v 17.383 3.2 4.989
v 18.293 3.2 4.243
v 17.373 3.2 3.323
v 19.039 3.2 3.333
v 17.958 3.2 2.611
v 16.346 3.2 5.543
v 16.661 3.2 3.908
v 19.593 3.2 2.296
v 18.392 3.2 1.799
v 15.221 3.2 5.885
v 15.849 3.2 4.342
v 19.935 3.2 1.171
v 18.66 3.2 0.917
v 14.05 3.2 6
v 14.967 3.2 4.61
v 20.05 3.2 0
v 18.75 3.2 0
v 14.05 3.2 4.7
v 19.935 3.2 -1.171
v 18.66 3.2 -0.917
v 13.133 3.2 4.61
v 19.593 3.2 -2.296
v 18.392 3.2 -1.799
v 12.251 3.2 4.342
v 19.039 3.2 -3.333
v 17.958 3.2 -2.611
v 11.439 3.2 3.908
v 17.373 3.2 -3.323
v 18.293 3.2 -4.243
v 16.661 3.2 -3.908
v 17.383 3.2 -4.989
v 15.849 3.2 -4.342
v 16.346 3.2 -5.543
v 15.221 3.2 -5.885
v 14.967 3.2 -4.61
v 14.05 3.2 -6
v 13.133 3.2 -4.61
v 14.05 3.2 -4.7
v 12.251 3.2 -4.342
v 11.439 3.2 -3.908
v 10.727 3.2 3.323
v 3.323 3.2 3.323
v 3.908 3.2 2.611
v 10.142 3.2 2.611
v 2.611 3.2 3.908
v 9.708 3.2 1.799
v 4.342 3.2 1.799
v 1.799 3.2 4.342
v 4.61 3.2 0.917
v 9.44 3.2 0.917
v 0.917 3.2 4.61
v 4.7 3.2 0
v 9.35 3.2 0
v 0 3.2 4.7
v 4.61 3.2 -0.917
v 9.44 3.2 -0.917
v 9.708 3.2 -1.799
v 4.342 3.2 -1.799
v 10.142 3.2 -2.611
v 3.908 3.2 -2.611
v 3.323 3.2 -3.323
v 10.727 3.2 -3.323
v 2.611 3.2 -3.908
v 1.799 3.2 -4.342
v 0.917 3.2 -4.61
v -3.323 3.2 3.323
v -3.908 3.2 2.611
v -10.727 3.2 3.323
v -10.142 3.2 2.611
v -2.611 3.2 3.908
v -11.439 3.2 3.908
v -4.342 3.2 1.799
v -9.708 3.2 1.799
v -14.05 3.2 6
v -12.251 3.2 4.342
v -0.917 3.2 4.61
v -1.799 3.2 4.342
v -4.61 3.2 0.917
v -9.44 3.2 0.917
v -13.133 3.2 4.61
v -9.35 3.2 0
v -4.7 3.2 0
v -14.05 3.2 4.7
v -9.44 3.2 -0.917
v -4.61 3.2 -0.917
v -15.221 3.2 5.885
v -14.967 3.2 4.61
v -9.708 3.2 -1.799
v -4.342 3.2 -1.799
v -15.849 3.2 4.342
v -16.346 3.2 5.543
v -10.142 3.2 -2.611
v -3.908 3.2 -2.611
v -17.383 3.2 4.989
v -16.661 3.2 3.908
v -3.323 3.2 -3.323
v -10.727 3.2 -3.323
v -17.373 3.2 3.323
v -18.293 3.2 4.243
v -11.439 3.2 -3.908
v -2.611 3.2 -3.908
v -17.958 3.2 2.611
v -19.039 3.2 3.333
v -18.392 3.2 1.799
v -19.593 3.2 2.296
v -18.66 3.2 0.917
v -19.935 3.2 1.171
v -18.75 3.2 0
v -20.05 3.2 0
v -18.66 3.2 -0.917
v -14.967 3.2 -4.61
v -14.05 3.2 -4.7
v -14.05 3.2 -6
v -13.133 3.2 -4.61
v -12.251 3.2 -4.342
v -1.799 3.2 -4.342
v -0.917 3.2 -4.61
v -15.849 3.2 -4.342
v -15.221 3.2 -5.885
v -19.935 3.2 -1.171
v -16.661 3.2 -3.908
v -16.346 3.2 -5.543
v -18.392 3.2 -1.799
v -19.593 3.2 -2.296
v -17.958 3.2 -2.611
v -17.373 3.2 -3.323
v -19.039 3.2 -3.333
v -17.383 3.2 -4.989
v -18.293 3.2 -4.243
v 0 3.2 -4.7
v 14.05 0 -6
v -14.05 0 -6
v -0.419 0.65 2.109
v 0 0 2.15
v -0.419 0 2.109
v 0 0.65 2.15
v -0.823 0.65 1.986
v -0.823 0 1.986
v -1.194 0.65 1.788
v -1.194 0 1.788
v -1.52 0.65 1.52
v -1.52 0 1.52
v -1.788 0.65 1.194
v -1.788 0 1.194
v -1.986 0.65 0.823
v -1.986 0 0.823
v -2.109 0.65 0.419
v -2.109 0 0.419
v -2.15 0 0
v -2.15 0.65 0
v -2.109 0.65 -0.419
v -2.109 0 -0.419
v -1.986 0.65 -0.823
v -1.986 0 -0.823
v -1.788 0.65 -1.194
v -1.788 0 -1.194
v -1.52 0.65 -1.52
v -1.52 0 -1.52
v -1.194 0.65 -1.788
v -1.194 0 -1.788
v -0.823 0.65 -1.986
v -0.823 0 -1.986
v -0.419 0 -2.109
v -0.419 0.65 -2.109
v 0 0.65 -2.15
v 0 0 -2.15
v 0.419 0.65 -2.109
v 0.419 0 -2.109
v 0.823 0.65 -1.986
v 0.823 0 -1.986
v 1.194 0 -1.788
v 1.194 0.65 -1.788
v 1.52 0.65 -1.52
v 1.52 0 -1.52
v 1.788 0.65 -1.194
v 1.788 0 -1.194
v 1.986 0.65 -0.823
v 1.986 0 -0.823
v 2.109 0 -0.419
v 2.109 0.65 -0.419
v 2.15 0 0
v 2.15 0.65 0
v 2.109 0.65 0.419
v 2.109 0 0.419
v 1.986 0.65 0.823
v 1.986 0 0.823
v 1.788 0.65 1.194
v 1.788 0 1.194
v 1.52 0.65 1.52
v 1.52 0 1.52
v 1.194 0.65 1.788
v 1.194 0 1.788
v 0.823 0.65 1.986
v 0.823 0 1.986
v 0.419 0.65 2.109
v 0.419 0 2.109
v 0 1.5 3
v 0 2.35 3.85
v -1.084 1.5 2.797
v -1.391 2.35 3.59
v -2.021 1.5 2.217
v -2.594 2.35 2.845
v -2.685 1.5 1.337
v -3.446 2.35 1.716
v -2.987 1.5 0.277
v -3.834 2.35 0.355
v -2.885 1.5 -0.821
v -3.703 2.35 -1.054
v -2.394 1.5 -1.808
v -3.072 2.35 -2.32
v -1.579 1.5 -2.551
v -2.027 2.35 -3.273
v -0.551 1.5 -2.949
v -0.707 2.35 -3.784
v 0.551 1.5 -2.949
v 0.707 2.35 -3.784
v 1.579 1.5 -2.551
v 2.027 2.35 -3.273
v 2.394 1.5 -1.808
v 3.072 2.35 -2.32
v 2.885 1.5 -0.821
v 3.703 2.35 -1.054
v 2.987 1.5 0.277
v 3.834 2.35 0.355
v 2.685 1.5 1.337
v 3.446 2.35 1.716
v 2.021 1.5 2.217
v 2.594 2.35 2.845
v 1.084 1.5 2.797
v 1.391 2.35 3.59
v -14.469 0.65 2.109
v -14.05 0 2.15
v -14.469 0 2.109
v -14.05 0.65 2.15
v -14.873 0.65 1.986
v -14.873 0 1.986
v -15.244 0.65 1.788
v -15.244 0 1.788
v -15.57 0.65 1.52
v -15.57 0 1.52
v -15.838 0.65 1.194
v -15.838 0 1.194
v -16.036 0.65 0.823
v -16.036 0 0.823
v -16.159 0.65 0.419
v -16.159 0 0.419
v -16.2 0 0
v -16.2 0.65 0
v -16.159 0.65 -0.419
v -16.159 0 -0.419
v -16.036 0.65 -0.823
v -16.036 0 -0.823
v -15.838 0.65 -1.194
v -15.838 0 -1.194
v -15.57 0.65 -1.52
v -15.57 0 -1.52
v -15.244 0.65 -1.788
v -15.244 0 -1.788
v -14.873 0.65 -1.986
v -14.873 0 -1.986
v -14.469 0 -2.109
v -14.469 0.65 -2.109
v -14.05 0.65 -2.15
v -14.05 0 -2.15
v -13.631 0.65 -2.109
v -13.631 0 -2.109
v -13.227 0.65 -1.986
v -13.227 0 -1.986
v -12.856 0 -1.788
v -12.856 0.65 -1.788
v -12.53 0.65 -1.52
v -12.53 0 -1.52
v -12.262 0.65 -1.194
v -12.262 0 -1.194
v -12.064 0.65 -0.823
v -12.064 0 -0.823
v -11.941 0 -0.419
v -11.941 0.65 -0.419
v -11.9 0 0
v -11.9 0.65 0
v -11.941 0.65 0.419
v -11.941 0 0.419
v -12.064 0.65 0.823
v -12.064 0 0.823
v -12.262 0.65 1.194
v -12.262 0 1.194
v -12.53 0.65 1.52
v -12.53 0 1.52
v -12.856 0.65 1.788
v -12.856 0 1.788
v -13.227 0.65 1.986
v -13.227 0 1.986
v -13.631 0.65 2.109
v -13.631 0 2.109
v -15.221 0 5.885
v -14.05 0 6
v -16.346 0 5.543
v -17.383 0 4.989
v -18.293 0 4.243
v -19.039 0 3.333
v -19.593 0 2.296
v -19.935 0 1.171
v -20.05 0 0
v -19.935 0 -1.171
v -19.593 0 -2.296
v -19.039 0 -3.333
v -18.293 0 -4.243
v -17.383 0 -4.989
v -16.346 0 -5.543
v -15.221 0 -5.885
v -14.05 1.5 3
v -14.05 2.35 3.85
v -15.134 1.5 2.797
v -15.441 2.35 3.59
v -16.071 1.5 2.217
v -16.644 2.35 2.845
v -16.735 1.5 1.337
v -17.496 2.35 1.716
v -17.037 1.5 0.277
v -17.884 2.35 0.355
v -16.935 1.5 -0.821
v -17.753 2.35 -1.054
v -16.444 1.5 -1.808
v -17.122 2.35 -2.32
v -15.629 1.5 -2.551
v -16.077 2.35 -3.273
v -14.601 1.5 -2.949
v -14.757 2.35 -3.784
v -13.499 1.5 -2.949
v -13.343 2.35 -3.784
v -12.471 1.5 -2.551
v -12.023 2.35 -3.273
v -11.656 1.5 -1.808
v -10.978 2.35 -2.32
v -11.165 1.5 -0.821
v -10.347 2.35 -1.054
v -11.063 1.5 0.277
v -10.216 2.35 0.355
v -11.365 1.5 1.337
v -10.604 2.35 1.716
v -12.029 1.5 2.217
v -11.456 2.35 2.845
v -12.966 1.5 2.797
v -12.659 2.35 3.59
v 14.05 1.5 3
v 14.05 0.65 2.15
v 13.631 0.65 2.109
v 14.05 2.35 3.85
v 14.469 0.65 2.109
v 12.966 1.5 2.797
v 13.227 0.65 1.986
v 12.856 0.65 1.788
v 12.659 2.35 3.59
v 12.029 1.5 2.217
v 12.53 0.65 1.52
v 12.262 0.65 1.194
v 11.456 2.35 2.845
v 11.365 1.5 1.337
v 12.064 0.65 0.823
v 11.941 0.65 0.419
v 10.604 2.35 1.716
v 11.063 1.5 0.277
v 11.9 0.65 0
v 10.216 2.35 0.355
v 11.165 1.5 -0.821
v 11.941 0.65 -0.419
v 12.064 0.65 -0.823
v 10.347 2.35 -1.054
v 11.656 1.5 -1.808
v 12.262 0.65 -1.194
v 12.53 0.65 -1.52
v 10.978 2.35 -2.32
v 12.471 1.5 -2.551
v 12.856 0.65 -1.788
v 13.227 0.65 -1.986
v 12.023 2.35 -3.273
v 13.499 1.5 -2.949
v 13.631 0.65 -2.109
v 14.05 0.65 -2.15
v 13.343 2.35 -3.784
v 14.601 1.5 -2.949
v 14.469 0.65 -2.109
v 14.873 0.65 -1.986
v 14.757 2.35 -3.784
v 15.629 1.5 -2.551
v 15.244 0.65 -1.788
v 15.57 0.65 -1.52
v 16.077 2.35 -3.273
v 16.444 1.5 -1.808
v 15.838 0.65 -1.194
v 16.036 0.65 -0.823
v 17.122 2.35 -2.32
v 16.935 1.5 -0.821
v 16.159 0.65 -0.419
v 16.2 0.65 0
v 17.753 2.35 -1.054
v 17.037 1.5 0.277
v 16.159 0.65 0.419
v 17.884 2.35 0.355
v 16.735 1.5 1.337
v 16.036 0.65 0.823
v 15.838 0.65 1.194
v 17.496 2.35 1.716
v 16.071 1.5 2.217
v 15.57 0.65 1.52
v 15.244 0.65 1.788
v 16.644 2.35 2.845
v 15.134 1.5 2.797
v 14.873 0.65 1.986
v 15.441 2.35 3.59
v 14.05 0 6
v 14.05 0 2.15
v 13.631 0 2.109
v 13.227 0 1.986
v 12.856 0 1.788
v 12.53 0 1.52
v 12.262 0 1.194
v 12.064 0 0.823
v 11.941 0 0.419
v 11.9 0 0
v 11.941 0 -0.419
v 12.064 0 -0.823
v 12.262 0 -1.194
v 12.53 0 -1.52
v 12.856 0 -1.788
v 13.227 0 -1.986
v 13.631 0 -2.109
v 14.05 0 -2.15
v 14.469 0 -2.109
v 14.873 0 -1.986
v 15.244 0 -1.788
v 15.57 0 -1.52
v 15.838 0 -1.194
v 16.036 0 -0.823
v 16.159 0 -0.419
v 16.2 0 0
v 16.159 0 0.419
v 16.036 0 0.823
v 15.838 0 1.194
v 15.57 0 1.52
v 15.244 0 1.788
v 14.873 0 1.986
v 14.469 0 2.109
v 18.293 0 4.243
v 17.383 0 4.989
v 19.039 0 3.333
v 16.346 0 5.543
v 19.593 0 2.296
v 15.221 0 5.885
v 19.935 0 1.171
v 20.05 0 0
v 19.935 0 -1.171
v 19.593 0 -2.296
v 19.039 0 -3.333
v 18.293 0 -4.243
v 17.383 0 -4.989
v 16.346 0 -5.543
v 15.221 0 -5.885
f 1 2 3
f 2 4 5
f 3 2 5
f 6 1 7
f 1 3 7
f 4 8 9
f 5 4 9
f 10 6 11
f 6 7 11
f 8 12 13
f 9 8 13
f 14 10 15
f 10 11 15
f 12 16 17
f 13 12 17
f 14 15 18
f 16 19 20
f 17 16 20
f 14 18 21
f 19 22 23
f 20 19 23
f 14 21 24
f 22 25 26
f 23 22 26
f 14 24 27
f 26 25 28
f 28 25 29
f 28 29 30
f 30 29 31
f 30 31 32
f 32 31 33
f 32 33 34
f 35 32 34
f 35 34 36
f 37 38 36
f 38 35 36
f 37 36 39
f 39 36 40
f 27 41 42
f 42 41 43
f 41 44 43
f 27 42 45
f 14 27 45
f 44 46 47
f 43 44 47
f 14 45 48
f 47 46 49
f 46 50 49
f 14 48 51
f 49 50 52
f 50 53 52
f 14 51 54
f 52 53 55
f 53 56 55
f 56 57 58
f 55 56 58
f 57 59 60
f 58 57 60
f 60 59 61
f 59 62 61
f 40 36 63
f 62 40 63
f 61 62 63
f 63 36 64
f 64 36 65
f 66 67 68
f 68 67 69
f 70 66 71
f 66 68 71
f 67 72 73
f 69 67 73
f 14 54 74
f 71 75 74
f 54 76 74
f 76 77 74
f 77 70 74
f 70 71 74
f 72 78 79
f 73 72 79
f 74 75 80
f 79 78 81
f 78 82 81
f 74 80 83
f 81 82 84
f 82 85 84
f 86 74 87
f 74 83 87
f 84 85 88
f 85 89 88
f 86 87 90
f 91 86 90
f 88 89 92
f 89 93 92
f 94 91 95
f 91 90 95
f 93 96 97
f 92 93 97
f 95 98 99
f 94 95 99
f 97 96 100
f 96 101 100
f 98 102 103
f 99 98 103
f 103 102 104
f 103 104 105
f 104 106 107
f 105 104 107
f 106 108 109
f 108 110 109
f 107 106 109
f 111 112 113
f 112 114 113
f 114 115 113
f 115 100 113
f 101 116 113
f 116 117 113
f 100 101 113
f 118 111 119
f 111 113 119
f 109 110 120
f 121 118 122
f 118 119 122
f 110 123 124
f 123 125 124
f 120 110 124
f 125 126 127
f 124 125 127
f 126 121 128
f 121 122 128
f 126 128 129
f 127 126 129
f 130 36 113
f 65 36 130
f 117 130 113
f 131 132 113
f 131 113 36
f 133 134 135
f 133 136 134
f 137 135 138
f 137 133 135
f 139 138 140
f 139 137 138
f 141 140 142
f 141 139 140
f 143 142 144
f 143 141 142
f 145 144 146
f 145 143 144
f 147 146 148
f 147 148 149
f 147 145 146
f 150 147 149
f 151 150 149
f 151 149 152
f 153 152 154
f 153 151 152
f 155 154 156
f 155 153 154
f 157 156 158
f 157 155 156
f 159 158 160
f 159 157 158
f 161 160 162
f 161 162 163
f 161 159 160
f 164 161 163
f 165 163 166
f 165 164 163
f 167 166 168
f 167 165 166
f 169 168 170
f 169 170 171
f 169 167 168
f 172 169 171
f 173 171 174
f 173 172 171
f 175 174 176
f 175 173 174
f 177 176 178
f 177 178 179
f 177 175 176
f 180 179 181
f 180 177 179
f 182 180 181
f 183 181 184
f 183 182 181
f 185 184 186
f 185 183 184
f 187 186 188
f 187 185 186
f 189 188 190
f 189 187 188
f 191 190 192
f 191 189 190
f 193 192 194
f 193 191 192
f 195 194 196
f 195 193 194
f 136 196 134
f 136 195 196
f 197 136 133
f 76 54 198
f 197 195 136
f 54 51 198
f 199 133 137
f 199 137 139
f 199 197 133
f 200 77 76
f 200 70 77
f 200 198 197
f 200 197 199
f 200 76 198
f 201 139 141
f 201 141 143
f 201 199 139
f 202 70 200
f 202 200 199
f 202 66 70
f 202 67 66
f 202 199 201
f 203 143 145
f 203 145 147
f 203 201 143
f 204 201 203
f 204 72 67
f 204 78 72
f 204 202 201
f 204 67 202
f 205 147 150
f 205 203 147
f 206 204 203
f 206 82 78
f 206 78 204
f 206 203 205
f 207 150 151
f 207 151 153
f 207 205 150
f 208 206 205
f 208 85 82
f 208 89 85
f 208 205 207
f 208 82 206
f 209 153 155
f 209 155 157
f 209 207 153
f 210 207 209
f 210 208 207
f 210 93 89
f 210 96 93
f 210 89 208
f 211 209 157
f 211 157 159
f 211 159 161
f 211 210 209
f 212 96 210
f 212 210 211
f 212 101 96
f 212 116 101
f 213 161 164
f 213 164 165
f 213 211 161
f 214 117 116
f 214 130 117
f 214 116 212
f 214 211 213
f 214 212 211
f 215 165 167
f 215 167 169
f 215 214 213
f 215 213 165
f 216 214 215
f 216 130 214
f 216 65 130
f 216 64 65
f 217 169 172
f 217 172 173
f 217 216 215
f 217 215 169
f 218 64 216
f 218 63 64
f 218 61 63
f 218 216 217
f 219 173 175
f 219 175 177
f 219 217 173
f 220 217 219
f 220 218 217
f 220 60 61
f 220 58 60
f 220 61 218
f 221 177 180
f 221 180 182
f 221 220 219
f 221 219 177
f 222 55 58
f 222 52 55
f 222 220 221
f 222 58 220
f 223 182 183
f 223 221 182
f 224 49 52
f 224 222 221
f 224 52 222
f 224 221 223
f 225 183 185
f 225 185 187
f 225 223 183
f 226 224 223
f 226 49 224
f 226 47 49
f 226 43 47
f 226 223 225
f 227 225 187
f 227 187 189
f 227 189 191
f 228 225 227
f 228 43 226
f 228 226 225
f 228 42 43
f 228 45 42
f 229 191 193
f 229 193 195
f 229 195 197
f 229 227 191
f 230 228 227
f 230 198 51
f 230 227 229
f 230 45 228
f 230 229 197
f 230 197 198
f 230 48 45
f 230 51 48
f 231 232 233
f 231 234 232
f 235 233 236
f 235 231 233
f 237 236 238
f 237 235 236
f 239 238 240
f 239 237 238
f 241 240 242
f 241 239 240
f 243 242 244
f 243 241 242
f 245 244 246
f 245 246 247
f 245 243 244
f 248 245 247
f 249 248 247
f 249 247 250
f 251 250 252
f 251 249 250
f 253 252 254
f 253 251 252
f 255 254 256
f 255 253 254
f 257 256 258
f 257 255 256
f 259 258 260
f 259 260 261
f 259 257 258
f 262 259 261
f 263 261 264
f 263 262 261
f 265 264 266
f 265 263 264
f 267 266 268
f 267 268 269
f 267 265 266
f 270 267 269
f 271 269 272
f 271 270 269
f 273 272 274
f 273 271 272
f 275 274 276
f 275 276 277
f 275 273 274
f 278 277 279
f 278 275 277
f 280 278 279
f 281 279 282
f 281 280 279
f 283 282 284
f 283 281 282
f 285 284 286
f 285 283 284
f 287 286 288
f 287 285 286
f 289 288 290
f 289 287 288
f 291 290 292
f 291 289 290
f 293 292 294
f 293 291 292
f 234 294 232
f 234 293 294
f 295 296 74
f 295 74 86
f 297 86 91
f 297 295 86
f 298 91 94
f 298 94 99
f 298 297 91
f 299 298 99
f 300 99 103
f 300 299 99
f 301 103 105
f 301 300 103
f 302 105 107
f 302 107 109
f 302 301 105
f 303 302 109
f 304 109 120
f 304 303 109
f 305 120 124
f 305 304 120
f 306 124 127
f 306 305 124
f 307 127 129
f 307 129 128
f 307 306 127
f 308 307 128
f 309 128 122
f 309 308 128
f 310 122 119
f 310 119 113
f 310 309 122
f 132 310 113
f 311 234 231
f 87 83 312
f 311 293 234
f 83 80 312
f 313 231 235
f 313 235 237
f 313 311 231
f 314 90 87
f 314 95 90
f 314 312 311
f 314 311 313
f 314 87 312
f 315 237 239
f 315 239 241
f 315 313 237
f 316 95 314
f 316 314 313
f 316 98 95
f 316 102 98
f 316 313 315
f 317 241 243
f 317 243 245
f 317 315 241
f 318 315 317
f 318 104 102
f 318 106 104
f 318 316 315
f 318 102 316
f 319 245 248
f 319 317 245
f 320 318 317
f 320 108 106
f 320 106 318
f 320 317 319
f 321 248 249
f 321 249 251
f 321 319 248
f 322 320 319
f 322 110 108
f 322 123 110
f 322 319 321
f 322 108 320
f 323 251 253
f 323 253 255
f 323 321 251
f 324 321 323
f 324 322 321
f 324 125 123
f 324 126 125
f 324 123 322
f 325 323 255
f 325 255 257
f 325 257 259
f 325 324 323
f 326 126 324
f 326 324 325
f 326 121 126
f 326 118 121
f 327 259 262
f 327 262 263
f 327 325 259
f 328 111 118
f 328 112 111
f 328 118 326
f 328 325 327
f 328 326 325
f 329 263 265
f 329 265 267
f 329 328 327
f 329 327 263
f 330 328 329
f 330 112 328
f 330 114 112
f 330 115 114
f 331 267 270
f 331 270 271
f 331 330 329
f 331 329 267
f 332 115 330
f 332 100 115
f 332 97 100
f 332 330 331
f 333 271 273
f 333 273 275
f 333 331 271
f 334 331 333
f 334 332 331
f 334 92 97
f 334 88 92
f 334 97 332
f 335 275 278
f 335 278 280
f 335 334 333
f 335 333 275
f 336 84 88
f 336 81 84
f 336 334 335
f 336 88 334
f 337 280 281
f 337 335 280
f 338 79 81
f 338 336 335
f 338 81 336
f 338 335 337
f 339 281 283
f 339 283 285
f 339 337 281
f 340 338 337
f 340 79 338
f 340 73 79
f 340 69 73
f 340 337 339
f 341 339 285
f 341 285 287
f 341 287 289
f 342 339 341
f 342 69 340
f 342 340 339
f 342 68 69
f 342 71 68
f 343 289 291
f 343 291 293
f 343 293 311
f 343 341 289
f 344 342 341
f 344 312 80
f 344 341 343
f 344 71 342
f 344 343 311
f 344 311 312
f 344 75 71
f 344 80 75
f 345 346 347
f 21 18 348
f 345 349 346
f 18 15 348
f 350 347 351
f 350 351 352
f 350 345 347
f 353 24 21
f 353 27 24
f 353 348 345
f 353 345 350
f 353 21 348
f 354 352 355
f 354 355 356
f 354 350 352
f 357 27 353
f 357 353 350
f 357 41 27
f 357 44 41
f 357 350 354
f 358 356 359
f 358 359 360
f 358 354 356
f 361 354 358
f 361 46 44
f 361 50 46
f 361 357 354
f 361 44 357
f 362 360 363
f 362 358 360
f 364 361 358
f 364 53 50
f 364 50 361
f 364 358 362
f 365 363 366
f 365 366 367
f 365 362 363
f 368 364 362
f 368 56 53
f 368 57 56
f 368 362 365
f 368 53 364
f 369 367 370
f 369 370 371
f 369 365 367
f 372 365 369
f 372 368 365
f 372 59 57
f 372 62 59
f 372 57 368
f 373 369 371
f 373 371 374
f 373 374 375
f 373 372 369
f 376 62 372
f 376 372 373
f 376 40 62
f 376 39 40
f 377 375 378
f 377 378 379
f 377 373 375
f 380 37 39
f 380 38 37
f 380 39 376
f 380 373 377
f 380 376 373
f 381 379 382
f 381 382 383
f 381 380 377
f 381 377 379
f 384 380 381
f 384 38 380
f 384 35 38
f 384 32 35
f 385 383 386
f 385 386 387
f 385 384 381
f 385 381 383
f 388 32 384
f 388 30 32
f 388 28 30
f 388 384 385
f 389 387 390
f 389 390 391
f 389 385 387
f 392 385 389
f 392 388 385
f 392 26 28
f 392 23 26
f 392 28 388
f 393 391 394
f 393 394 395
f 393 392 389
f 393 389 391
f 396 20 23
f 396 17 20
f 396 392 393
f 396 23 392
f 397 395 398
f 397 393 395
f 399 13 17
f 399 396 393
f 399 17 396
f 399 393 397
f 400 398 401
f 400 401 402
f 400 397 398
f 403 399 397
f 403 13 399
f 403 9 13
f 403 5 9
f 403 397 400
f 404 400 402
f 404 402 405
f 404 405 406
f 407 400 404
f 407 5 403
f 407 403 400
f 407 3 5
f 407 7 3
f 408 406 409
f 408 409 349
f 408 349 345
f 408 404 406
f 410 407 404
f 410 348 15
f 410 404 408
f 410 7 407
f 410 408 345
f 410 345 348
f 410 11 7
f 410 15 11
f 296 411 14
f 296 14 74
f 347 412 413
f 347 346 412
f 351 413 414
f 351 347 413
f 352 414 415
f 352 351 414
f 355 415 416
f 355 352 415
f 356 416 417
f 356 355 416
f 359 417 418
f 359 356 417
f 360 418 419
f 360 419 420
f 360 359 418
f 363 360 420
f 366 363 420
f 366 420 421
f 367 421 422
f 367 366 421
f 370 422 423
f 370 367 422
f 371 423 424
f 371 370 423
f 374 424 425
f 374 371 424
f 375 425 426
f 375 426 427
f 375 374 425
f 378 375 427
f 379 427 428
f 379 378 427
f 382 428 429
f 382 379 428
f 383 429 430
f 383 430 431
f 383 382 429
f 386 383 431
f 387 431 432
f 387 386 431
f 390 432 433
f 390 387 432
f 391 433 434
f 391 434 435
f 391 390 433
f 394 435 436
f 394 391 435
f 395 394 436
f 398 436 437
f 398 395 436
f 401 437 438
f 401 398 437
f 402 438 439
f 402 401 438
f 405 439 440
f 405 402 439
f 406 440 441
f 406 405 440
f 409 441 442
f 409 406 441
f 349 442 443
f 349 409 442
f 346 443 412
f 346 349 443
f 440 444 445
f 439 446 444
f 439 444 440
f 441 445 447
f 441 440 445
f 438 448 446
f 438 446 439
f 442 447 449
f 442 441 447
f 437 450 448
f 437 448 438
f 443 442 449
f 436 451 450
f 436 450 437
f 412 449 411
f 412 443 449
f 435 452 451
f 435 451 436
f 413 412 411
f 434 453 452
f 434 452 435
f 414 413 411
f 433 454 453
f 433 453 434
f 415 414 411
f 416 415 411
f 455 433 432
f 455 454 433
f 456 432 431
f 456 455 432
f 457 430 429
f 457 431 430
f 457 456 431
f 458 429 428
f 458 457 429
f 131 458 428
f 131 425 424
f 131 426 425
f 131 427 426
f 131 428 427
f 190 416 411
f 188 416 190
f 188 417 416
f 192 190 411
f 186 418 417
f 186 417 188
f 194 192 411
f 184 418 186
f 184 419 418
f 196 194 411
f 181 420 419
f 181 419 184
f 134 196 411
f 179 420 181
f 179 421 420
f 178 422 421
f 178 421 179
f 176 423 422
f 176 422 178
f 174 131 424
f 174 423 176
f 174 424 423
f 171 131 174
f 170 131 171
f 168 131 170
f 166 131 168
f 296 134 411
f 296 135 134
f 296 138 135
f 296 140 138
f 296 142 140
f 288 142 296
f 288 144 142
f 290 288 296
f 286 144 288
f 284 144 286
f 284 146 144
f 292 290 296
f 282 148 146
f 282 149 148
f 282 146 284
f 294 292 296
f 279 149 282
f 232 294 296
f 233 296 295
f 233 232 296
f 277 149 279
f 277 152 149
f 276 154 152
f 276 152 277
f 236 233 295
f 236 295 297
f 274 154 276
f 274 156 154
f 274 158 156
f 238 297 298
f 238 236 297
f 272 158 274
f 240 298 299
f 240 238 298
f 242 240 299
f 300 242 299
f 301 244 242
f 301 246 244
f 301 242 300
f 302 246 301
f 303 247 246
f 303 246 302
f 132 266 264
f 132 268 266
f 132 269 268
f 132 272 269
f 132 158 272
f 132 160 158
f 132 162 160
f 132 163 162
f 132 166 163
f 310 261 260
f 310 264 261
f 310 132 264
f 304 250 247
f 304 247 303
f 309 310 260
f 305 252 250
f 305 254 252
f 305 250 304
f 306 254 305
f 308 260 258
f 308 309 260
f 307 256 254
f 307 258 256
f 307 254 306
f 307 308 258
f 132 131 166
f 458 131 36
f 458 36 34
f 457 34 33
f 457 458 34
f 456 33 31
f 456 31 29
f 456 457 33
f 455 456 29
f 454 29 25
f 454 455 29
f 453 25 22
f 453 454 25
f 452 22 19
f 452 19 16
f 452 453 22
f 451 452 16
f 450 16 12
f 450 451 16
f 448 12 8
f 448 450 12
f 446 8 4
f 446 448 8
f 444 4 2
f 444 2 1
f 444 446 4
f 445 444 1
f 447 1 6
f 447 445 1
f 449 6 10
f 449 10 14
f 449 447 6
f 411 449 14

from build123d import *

# Parameters (mm, degrees)
BOSS_EXTRUDE2_DEPTH                          = 3.2
CSK_FOR_M4_COUNTERSUNK_FLAT_HEAD1_AT_2_COUNT = 2
CSK_FOR_M4_COUNTERSUNK_FLAT_HEAD1_AT_2_PITCH = 14.05
CSK_FOR_M4_COUNTERSUNK_FLAT_HEAD1_AT_3_COUNT = 2
CSK_FOR_M4_COUNTERSUNK_FLAT_HEAD1_AT_3_PITCH = 14.05


with BuildPart() as part:
    # Sketch3 → Boss-Extrude2 (new body)
    with BuildSketch(Plane(origin=(0, 0, 0), x_dir=(1, 0, 0), z_dir=(0, 1, 0))):
        with BuildLine():
            Line((-14.05, 6), (14.05, 6))
            ThreePointArc((14.05, 6), (20.05, 0), (14.05, -6))
            Line((14.05, -6), (-14.05, -6))
            ThreePointArc((-14.05, -6), (-20.05, 0), (-14.05, 6))
        make_face()
    extrude(amount=BOSS_EXTRUDE2_DEPTH)

    # Sketch5 → CSK for M4 Countersunk Flat Head1 (revolve, cut)
    with BuildSketch(Plane(origin=(0, 3.2, 0), x_dir=(0, 0, 1), z_dir=(1, 0, 0))):
        Polygon((0, 0), (0, 3.2), (2.15, 3.2), (2.15, 2.55), (4.7, 0), align=None)
    csk_for_m4_countersunk_flat_head1 = revolve(axis=Axis((0, 9.55, 0), (0, -1, 0)), mode=Mode.SUBTRACT)

    # CSK for M4 Countersunk Flat Head1 at 2: CSK for M4 Countersunk Flat Head1 ×2
    with Locations(*[(i * CSK_FOR_M4_COUNTERSUNK_FLAT_HEAD1_AT_2_PITCH, 0, 0) for i in range(1, CSK_FOR_M4_COUNTERSUNK_FLAT_HEAD1_AT_2_COUNT)]):
        add(csk_for_m4_countersunk_flat_head1, mode=Mode.SUBTRACT)

    # CSK for M4 Countersunk Flat Head1 at 3: CSK for M4 Countersunk Flat Head1 ×2
    with Locations(*[(-i * CSK_FOR_M4_COUNTERSUNK_FLAT_HEAD1_AT_3_PITCH, 0, 0) for i in range(1, CSK_FOR_M4_COUNTERSUNK_FLAT_HEAD1_AT_3_COUNT)]):
        add(csk_for_m4_countersunk_flat_head1, mode=Mode.SUBTRACT)


solid = part.part
